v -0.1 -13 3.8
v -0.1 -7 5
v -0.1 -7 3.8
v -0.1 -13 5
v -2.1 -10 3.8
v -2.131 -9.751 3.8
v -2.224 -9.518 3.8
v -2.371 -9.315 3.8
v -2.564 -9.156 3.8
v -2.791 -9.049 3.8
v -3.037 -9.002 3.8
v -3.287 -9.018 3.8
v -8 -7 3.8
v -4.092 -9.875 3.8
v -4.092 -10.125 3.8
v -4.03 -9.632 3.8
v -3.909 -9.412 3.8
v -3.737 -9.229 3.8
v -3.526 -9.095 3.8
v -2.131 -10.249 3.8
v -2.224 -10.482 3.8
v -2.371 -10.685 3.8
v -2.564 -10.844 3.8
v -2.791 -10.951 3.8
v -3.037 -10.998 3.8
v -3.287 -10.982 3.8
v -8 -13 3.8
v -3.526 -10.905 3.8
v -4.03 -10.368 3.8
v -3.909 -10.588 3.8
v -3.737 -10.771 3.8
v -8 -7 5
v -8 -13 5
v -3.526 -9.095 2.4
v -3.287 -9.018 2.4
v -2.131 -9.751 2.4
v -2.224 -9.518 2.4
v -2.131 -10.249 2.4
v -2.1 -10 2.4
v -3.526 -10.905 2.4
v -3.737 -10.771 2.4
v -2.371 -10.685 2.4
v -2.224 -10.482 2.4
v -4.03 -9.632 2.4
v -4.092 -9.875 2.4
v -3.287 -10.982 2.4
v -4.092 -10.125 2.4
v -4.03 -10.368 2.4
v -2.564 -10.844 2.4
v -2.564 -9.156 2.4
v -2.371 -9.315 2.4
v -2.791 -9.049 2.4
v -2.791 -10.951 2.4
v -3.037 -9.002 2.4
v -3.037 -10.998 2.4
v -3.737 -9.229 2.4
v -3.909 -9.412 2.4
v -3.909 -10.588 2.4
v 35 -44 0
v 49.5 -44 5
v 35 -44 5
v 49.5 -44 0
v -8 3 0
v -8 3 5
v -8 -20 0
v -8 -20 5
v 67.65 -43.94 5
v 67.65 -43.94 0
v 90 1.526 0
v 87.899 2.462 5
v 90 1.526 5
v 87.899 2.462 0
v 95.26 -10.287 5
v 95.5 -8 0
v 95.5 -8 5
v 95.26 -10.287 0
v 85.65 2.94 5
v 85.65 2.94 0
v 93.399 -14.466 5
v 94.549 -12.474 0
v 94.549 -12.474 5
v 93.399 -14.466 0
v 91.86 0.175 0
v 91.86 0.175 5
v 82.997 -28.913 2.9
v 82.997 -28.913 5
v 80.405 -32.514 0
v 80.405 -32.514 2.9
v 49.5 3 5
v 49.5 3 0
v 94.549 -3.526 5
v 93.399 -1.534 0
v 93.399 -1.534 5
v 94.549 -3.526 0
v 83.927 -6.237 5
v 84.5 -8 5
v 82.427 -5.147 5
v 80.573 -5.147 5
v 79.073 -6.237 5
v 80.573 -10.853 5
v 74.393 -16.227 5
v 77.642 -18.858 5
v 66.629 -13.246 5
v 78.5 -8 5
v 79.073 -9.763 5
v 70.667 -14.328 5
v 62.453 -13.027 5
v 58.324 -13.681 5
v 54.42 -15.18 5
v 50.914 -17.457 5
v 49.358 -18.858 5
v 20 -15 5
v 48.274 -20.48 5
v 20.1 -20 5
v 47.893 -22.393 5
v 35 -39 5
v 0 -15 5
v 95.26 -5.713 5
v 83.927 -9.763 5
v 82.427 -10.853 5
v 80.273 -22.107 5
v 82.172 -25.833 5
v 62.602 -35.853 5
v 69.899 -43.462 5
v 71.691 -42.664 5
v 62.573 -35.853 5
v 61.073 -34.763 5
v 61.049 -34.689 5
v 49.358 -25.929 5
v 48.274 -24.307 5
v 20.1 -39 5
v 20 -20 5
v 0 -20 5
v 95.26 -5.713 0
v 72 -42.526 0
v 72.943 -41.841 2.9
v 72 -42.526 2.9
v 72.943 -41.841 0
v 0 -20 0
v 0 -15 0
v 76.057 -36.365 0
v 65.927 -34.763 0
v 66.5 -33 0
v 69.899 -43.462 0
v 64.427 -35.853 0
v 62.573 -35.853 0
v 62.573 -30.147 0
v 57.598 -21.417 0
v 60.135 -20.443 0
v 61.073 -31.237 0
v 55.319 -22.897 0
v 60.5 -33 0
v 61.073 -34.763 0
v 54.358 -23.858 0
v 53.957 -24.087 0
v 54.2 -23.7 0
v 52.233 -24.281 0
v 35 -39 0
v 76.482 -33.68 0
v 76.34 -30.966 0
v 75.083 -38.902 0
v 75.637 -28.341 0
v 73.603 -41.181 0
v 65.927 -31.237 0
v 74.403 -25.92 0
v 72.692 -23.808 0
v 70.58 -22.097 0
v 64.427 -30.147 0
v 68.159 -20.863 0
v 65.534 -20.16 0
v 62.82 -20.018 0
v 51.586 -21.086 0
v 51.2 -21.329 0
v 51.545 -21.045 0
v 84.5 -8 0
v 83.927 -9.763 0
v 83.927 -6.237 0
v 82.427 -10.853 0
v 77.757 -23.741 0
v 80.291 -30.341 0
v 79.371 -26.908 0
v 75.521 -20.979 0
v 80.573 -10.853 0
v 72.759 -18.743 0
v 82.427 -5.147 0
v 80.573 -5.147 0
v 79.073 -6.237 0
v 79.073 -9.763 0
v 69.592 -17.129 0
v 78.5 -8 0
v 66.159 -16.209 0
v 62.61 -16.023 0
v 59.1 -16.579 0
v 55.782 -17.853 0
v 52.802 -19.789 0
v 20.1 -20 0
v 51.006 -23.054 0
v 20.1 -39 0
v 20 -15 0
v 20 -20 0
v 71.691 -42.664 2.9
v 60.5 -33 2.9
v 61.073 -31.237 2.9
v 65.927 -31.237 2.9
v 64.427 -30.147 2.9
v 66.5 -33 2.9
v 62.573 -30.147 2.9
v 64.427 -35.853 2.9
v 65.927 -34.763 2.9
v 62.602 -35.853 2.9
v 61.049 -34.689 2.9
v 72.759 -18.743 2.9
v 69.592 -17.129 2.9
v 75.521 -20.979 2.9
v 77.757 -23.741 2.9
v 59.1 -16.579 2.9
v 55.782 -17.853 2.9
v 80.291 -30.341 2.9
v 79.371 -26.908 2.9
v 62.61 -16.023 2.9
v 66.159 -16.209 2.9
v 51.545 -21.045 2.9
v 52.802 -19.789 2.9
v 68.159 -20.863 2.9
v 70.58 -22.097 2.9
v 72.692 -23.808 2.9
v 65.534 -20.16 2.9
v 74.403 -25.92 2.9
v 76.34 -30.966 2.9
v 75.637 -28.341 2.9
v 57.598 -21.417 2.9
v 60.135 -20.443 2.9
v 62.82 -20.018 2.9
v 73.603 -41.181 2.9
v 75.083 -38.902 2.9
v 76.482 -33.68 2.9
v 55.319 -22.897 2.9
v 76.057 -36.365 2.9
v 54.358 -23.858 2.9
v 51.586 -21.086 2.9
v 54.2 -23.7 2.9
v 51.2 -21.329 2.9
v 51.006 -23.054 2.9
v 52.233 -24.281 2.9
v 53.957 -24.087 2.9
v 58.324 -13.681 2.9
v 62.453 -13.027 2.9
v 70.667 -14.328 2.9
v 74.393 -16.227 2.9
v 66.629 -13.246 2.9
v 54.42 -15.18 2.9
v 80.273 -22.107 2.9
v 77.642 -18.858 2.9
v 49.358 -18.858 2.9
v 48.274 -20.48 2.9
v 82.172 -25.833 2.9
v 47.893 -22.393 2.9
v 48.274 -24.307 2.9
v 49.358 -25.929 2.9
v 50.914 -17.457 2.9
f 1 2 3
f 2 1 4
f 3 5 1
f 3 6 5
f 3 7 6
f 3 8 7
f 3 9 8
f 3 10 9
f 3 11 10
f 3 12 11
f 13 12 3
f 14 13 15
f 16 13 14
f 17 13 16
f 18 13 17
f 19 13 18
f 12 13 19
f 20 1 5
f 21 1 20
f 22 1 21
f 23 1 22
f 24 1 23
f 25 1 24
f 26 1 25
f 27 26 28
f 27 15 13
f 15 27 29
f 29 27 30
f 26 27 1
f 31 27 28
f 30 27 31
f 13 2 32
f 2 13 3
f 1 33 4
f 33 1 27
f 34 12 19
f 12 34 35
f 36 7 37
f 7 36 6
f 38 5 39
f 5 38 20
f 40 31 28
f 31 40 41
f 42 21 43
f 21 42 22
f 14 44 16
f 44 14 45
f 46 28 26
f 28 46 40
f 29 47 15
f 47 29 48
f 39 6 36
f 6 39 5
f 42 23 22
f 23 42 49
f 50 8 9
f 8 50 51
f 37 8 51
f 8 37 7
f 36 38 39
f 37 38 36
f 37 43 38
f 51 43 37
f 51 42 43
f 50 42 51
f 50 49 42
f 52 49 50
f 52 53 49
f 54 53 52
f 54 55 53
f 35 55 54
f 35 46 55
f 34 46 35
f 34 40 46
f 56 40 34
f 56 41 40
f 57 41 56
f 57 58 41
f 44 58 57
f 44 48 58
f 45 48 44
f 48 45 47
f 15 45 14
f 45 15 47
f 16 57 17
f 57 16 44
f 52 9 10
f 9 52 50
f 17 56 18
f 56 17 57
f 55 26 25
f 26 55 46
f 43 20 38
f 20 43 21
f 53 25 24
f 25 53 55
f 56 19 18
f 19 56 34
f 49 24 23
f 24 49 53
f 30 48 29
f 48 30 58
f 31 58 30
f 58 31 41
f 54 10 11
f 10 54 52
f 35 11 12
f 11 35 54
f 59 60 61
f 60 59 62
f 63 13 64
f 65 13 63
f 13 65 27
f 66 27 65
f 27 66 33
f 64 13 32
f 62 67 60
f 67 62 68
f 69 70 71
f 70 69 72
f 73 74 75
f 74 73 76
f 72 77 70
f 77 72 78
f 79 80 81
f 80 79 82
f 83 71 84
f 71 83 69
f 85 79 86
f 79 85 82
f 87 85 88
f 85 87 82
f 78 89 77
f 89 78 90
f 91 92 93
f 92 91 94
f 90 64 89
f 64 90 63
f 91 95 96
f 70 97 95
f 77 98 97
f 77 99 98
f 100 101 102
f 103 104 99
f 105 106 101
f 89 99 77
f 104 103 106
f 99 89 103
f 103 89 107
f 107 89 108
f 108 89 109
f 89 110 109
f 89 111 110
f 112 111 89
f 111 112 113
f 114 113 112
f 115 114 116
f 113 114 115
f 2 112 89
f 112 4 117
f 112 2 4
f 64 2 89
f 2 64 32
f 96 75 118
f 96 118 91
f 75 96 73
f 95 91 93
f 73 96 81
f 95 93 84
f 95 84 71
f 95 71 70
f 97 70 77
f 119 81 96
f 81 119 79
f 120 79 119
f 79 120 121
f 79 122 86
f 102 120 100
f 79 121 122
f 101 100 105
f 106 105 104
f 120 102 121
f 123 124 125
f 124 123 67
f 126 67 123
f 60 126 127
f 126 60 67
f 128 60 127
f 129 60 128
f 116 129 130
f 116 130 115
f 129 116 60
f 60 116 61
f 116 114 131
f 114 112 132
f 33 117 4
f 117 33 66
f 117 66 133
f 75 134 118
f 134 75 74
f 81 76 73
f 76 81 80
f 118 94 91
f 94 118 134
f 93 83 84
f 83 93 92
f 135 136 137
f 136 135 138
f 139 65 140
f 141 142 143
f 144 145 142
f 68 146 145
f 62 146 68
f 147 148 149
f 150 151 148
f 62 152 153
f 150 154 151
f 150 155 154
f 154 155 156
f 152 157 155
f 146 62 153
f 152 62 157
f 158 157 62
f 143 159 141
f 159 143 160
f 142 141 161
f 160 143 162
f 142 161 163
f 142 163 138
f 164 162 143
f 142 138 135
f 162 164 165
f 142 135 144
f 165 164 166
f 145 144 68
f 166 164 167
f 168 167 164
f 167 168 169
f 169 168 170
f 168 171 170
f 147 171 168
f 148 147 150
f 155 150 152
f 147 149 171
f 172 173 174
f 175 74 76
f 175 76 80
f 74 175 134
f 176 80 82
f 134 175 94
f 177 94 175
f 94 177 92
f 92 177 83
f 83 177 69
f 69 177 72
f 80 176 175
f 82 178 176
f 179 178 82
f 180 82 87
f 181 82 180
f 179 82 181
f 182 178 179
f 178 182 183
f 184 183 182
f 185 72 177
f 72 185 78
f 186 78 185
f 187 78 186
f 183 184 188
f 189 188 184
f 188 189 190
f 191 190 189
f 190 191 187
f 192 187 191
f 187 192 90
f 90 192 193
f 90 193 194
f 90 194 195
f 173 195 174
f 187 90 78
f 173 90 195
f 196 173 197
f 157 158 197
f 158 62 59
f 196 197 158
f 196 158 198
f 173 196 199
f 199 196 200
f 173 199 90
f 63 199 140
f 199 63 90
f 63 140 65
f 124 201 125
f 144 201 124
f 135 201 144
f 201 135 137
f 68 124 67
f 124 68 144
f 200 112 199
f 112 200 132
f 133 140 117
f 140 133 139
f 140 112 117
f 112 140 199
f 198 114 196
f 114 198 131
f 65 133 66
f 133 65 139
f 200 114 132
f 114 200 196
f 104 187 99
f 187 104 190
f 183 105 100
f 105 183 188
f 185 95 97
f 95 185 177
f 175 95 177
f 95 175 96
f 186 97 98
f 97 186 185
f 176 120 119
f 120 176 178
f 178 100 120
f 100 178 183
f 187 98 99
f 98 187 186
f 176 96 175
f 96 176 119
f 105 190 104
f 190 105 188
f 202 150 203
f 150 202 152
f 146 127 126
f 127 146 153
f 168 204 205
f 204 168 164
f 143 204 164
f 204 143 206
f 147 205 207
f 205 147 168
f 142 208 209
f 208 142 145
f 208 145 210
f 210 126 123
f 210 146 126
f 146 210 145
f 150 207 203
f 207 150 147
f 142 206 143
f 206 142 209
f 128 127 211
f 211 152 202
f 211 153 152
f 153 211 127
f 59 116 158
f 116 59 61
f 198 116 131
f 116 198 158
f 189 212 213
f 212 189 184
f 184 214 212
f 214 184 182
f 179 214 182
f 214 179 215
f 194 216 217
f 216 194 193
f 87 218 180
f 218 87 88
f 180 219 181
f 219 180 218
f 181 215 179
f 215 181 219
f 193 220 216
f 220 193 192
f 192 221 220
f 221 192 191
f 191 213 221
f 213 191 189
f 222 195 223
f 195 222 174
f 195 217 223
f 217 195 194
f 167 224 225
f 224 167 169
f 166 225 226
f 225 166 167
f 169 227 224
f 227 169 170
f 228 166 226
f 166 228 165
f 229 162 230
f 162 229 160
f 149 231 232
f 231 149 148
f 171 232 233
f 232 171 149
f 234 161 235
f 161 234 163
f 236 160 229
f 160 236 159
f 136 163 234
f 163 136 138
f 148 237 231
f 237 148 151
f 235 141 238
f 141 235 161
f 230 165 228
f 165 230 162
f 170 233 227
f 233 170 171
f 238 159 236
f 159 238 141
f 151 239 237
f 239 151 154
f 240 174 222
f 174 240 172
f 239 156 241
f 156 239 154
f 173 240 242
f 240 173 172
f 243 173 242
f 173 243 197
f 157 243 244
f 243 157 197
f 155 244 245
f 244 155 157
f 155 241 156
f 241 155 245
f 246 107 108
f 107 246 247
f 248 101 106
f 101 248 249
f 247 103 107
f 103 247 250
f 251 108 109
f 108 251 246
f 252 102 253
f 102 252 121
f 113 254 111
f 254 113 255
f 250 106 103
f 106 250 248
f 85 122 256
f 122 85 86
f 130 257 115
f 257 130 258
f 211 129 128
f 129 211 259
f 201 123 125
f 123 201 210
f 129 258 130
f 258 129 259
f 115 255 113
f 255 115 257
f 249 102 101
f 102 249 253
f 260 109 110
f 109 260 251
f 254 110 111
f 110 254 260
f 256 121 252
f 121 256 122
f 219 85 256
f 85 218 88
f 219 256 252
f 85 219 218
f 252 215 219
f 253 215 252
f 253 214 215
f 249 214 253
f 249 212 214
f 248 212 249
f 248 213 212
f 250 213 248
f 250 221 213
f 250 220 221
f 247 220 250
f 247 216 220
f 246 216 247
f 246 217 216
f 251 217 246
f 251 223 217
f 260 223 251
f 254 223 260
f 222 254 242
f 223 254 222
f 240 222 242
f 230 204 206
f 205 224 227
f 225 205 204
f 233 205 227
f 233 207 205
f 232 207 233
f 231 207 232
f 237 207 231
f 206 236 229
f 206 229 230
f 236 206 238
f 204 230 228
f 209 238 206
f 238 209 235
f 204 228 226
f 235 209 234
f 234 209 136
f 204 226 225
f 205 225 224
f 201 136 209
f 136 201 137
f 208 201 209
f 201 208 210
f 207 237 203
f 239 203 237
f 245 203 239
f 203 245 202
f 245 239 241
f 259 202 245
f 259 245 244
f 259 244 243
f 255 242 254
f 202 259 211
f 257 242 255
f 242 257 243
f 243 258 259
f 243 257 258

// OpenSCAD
// file: Connector.scad
include <Settings.scad>;

ConnectorDefaults_Length = 8;
ConnectorDefaults_Width = 6;
ConnectorDefaults_Thickness = 5;
ConnectorDefaults_HoleRadius = 1;
ConnectorDefaults_SlipRadius = 0.2; // Radius increase in clip to allow thread to slip

ConnectorTest();

module Clip(
Length =ConnectorDefaults_Length,
Width = ConnectorDefaults_Width,
Thickness = ConnectorDefaults_Thickness,
HoleRadius = ConnectorDefaults_HoleRadius,
SlipRadius = ConnectorDefaults_SlipRadius){
	translate(v = [0,-Width/2,Thickness/2])
		difference(){
			translate(v = [-d,0,0]){
				cube(size=[Length+d,Width,Thickness/2]);
			}
			translate(v = [Length-(Width/2),Width/2,-d])
				color("blue")cylinder(h=Thickness+2*d,r= HoleRadius+SlipRadius, $fn =25);
		}
}

module ClipHole(
Length =ConnectorDefaults_Length,
Width = ConnectorDefaults_Width,
Thickness = ConnectorDefaults_Thickness,
HoleRadius = ConnectorDefaults_HoleRadius){
translate(v = [0,-Width/2,Thickness/2])
	union(){
		translate(v = [-d,0,0])
			cube(size=[Length+d,Width,Thickness/2+d]);
		translate(v = [Length-(Width/2),Width/2,(-Thickness/2)-d])
			color("red")cylinder(h=Thickness+2*d,r= HoleRadius, $fn =25);
	}
}





module ConnectorTest(){

	translate(v = [0,20,0])
		ClipHole();

	translate(v = [0,40,0])
		Clip();

	%color("green") difference(){
		union(){
			difference(){
				translate(v = [-5,-10,0])
					cube(size = [30,20,5]);
			
				translate(v = [0,0,0])
					ClipHole();
			}
		}
		translate(v = [-6,-22,-1])
			color("green") cube(size = [32,22,7]);
	}

	difference(){
		translate(v = [0,0,0])
			color("red") Clip();
		translate(v = [-6,-22,-1])
			color("red") cube(size = [32,22,7]);
	}
}
// file: Settings.scad
// Mesurements Of Platform Actual & Global Settings
// Mesurements ACTUAL
PlateWidth = 228;
PlateDepth = 145;
PlateHeight = 5;

ArmWidth = 20;
ArmHeight = 24;
ArmForwardProjection = 25;
ArmRearProjection = 50;
ArmVOffset = 15;

BaseWidth = 129;
BaseHeight = 5;
BaseForwardProjection = 10;
BaseRearProjection = 10;
BaseVOffset = 20;

BaseDeflectorLength = 20;
BaseDeflectorAngle = 45;

ScrewsWidthOutset = 35;
ScrewsDepthOutset = 35;
ScrewsHeadRadius = 10;
ScrewsHeadHeight = 2;
ScrewsHeadProtrusion = 5;
ScrewsShaftRadius = 2;
ScrewsHeadCutoutRadius = 2;

RearPlugWidth = 10;
RearPlugHeight = 5;
RearPlugVOffset = 1;

// Options
// ****************************************************************************************************

d = 0.1;   //Delta

ClipSticksize = 8;
PlateThickness = 5;

TensionerBearingRadius = 2;
TensionerOffsetRadius = 15;
TensionerAngle = 45;
TensionerBearingExtention = 3;
TensionerInset = 2;

//lips to keep the belt in
Lip = 3;
//TopLip = 500;
BottomLip = 5;

MidPlateOverlap = 20;
MidPlateOverlapHeight = 10;
MidPlateOverlapOffset = 5;
ClipHoleSize = 5;

LowerPlateCrossover = 15;

RollerCore = 2;
RollerClearance = 0.5;
RollerLength = PlateDepth - 2*RollerClearance;

UpperRollerProjection  = 40;
UpperRollerRadius = 8;

LowerRollerProjection = 20;
LowerRollerRadius = 6;

UpperRollerBearingCutoutRadius = 3;
LowerRollerBearingCutoutRadius = 3;

// Calculated
// ************************************************************************************************************
PlateX = BaseWidth/2;

RollerLength = PlateDepth - 2*RollerClearance;
PlateArmOverhang = PlateWidth/2 - BaseWidth/2  - ArmWidth; 

UpperRollerPlateX = ArmWidth+PlateArmOverhang+UpperRollerProjection-UpperRollerRadius;
UpperRollerPlateY = -UpperRollerRadius; 

LowerRollerPlateX = ArmWidth+PlateArmOverhang+LowerRollerProjection-LowerRollerRadius;
LowerRollerPlateY = -(ArmVOffset+ArmHeight)+LowerRollerRadius;
// main file
// Roller Project Part #1 Front Bracket

include <Settings.scad>;
use <Connector.scad>;

FrontRightPlate();
//RearRightPlate();
//FrontLeftPlate();
//RearLeftPlate();


module TensionCurve(Radius,Depth){
	union(){
		difference(){
			translate(v=[0,0,]){
				color("red") cylinder(h =Depth ,r =TensionerOffsetRadius+Radius);
			}
			translate(v=[0,0,-d])
				cylinder(h =Depth+2*d ,r =TensionerOffsetRadius-Radius);	
		
			translate( v = [-(TensionerOffsetRadius+Radius),-(TensionerOffsetRadius+Radius),-d])
				cube(size = [TensionerOffsetRadius+Radius,2*(TensionerOffsetRadius+Radius),Depth+2*d]);
		}
		translate(v=[0,TensionerOffsetRadius,0])
			cylinder(h =Depth ,r =Radius);	
	}
}

module FrontRightPlate(){
	RightPlate();
}

module RearRightPlate(){
	mirror([ 0, 1, 0 ]){
		RightPlate();
	}
}

module FrontLeftPlate(){
	LeftPlate();
}

module RearLeftPlate(){
	mirror([ 0, 1, 0 ]){
		LeftPlate();
	}
}

module RightPlate(){
	difference(){
		GenericPlate();
		translate(v=[LowerRollerPlateX,LowerRollerPlateY,-d]){
			rotate(a = TensionerAngle, v=[0,0,1] ){
				TensionCurve(TensionerBearingRadius, PlateThickness +2*d );
				translate(v=[0,0,PlateThickness-TensionerInset])
					hull()
						TensionCurve(TensionerBearingRadius+TensionerBearingExtention , TensionerInset+2*d);
			}
		}
	}
}

module LeftPlate(){
	mirror([ 1, 0, 0 ]){
	GenericPlate();
	}
}

module GenericPlate(){
	difference(){
		union(){
			color("blue") hull(){
				//main block
				translate(v = [-ClipSticksize,-(ArmVOffset+ArmHeight)-BottomLip,0]){
					color("red") cube(size = [ClipSticksize+ArmWidth+PlateArmOverhang,
ArmHeight+ArmVOffset+Lip+BottomLip,
PlateThickness]);
				}
				//magic lower block
				translate(v = [-ClipSticksize,-(ArmVOffset+ArmHeight+Lip+ClipSticksize),0]){
					//color("red") cube(size = [ClipSticksize+ArmWidth+PlateArmOverhang,1,PlateThickness]);
				}
				//top curve
				translate(v = [UpperRollerPlateX+Lip,UpperRollerPlateY,0]){
					cylinder(h= PlateThickness ,r = UpperRollerRadius+Lip); 
				}
				//lower curve
				 translate(v = [LowerRollerPlateX+Lip,LowerRollerPlateY,0]){
					cylinder(h= PlateThickness ,r = LowerRollerRadius+BottomLip); 
				}
			}
		}
		// Arm Hole
		translate(v = [0,-(ArmVOffset+ArmHeight)-d,-d]){
			cube(size = [ArmWidth,ArmHeight+d,PlateThickness+2*d]);
		}
		//base hole
		translate(v = [-ClipSticksize-d,-BaseVOffset-BaseHeight-ArmHeight,-d]){
			cube(size = [ClipSticksize+ArmWidth+2*d,BaseHeight+ArmHeight,PlateThickness+2*d]);
		}
		//upper bearing hole
		translate(v = [UpperRollerPlateX,UpperRollerPlateY,-d]){
			cylinder(h= PlateThickness+2*d ,r = UpperRollerBearingCutoutRadius);
		}
		//lower bearing hole
		translate(v = [LowerRollerPlateX,LowerRollerPlateY,-d]){
			cylinder(h= PlateThickness+2*d ,r = LowerRollerBearingCutoutRadius);
		}

		//top clip
		translate(v = [-ClipSticksize-d, -ArmVOffset+MidPlateOverlapOffset,PlateThickness/2])
			ClipHole(Thickness= PlateThickness/2+d);

		translate(v= [ArmWidth,-(ArmVOffset+ArmHeight+BottomLip+d),-d])
			cube(size = [LowerPlateCrossover,BottomLip+d,PlateThickness+2*d]);


	}
}//end module
